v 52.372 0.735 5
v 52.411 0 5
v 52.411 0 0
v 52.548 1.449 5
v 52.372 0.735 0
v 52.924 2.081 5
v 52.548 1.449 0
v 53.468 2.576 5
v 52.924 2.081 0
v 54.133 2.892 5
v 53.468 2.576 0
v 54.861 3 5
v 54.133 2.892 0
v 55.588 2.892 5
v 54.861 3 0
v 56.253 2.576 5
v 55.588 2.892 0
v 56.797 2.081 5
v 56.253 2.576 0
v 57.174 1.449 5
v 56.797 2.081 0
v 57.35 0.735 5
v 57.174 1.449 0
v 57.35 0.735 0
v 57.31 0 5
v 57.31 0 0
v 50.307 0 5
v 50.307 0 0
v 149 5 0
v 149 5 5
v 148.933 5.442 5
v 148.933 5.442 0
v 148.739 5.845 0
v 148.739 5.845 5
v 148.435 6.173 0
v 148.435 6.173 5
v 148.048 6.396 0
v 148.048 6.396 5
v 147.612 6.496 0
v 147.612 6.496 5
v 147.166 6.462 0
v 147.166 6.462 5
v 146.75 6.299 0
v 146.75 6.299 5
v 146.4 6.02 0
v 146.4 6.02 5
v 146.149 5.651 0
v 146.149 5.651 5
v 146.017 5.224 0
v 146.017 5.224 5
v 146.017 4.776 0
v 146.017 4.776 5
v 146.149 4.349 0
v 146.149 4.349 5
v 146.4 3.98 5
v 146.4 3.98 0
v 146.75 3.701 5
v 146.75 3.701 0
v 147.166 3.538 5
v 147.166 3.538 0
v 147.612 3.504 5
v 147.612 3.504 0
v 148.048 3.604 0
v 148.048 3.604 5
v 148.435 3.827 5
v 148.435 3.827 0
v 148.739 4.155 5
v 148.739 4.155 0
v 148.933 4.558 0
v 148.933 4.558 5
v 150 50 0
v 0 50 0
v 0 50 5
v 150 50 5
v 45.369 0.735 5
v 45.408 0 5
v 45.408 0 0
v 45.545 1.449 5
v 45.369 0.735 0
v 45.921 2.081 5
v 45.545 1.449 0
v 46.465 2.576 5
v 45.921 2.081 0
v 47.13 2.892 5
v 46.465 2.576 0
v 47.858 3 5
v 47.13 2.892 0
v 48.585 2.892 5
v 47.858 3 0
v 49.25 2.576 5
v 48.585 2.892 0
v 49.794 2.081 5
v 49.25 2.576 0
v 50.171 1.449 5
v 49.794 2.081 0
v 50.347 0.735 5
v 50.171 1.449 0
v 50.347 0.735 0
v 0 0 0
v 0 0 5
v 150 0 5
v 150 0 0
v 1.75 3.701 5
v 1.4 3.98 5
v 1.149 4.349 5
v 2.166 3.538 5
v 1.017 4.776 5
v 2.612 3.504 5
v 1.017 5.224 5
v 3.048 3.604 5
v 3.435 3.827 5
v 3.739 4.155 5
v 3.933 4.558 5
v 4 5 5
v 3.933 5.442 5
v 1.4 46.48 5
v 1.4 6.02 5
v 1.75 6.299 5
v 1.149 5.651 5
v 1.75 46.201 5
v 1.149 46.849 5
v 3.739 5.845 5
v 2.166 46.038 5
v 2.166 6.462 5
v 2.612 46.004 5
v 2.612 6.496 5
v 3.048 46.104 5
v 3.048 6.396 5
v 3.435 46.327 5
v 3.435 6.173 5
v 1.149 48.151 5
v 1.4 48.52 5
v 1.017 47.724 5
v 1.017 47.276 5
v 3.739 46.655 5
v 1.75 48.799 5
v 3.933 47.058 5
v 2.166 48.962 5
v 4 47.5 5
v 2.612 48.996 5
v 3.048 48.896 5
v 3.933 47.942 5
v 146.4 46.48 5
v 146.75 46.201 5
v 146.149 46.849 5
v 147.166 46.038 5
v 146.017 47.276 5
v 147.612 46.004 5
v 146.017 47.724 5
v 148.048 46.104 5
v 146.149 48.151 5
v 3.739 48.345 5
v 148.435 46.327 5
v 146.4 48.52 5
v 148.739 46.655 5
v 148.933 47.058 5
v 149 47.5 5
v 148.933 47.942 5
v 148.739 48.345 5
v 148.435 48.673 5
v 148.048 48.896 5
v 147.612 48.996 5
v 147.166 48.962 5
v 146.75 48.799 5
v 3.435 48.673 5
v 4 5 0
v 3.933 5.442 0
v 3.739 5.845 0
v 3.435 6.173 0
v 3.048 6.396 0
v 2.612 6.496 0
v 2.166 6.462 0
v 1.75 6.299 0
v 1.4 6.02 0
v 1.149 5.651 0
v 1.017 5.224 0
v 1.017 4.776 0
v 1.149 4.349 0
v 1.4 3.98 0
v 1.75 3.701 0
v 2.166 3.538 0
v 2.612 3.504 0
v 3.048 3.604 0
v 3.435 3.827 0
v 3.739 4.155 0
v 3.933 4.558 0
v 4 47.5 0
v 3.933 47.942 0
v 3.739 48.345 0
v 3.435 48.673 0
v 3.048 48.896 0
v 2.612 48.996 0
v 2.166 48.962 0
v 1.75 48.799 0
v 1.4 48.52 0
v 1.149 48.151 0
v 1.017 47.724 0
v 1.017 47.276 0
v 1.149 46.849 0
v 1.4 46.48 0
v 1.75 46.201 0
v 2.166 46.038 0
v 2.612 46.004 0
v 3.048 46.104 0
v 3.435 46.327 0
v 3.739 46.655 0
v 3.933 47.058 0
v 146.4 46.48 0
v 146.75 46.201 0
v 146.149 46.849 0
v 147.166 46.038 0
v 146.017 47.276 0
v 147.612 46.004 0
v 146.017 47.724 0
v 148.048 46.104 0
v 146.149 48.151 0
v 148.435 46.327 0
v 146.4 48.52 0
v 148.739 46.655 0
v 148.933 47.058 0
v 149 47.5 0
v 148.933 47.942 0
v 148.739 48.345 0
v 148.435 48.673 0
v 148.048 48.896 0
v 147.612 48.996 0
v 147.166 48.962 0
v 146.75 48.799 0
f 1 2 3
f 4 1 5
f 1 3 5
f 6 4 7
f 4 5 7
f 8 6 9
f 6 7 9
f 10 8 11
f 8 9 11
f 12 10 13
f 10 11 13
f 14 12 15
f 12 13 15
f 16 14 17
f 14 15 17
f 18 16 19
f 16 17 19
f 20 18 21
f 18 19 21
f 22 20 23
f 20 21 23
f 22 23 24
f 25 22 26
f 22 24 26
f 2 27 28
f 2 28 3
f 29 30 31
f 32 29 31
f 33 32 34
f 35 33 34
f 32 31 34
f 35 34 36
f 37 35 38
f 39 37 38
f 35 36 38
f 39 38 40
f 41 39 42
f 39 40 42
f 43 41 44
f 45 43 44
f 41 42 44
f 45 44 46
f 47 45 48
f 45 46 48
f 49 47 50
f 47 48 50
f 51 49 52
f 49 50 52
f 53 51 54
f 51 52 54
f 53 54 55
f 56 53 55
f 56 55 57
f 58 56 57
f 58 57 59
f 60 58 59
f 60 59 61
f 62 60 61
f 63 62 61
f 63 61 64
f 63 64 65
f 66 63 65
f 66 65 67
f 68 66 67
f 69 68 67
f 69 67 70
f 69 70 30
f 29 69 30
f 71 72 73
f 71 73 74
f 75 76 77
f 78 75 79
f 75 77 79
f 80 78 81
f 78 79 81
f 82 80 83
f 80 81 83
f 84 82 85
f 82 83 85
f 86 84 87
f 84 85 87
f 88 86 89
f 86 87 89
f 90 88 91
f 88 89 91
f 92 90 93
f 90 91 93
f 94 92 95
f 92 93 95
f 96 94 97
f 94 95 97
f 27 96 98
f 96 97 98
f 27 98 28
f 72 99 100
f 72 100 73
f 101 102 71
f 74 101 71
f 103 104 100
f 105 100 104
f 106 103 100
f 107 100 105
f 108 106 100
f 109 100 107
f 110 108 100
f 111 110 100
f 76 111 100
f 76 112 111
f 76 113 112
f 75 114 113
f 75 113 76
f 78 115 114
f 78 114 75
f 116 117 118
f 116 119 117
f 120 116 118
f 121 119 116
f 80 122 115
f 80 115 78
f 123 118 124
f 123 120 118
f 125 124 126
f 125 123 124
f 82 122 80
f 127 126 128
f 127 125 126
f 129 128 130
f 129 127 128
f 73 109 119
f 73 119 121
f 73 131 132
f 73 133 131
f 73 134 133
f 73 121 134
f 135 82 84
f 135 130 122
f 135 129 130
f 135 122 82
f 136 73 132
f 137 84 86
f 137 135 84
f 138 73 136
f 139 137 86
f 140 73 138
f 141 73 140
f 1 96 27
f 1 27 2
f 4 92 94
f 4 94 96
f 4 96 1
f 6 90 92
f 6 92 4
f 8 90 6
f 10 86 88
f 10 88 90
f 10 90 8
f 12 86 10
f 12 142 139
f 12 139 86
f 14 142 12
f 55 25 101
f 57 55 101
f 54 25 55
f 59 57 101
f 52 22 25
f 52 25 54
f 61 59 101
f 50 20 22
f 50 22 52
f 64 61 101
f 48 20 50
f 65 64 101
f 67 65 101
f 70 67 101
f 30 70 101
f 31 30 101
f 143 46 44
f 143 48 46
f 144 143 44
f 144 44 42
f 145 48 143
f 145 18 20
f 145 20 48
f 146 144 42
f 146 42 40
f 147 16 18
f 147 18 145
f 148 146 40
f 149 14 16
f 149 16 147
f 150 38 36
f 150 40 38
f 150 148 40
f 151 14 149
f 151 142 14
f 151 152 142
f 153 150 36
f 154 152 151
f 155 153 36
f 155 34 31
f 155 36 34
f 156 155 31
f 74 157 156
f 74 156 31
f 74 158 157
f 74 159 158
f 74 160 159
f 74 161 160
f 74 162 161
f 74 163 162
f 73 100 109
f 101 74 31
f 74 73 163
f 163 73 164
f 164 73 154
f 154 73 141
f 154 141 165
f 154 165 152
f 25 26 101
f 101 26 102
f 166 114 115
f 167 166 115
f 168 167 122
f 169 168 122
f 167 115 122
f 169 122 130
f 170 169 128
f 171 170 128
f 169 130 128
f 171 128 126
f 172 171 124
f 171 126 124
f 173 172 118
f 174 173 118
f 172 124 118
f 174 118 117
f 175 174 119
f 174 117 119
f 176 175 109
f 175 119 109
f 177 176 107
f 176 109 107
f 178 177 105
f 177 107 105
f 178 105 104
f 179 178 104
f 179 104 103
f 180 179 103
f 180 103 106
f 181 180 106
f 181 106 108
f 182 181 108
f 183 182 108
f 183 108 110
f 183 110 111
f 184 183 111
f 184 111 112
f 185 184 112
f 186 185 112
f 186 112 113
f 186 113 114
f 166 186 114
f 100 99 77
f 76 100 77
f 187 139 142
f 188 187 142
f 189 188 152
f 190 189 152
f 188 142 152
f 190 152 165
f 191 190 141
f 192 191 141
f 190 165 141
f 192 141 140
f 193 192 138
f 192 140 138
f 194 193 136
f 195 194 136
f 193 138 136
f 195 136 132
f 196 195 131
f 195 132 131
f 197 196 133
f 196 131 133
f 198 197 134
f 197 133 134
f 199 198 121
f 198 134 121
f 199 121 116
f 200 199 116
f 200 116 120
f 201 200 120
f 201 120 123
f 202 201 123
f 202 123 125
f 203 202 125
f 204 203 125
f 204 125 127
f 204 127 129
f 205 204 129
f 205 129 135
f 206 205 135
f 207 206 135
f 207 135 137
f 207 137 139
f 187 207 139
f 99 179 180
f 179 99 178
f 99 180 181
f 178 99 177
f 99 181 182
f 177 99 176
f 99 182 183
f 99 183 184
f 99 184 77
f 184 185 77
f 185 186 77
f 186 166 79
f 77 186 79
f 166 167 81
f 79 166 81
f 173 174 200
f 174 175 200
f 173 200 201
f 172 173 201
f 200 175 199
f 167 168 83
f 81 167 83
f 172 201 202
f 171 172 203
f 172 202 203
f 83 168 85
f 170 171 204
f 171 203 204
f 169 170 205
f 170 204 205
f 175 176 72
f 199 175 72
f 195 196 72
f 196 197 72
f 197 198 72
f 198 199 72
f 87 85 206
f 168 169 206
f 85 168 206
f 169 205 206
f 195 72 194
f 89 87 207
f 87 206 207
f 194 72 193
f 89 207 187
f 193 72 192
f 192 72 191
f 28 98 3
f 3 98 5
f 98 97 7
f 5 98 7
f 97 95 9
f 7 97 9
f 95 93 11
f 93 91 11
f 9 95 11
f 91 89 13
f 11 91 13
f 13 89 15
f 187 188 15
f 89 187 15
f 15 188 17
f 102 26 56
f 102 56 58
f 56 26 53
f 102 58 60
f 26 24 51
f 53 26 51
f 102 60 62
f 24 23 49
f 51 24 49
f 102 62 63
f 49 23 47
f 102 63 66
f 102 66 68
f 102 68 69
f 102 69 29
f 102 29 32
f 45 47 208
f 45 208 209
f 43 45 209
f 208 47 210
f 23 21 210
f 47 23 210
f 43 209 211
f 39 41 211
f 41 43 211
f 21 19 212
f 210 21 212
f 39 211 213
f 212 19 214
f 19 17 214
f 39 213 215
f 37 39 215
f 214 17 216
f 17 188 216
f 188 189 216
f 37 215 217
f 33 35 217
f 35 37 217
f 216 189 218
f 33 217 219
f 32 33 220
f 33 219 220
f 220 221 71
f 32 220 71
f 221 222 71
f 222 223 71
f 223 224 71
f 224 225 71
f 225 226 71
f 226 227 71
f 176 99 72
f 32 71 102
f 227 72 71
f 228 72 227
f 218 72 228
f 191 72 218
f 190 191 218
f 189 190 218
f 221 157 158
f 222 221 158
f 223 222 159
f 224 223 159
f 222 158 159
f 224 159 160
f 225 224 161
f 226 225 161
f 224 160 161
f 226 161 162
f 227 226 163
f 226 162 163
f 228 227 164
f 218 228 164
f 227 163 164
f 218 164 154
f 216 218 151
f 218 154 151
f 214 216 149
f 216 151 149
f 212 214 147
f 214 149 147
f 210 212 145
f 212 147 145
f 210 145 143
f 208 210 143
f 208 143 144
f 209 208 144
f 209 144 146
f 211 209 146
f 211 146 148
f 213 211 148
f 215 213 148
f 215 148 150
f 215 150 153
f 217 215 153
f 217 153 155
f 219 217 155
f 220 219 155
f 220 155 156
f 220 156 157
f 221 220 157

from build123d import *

# Parameters (mm, degrees)
SKETCH1_W           = 150
SKETCH1_H           = 50
BOSS_EXTRUDE1_DEPTH = 5
SKETCH2_R           = 1.5
CUT_EXTRUDE1_DEPTH  = 10
SKETCH3_R           = 2.5
CUT_EXTRUDE2_DEPTH  = 159.192920196


with BuildPart() as part:
    # Sketch1 → Boss-Extrude1 (new body)
    with BuildSketch(Plane.XY):
        with Locations((75, 25)):
            Rectangle(SKETCH1_W, SKETCH1_H)
    extrude(amount=BOSS_EXTRUDE1_DEPTH)

    # Sketch2 → Cut-Extrude1 (cut)
    with BuildSketch(Plane.XY.offset(5)):
        with Locations((2.5, 5)):
            Circle(SKETCH2_R)
        with Locations((2.5, 47.5)):
            Circle(SKETCH2_R)
        with Locations((147.5, 47.5)):
            Circle(SKETCH2_R)
        with Locations((147.5, 5)):
            Circle(SKETCH2_R)
    extrude(amount=-CUT_EXTRUDE1_DEPTH, mode=Mode.SUBTRACT)

    # Sketch3 → Cut-Extrude2 (cut, through all)
    with BuildSketch(Plane(origin=(0, 0, 0), x_dir=(-1, 0, 0), z_dir=(0, 0, -1))):
        with Locations((-54.86063832, 0.5)):
            Circle(SKETCH3_R)
        with Locations((-47.857694484, 0.5)):
            Circle(SKETCH3_R)
    extrude(amount=-CUT_EXTRUDE2_DEPTH, mode=Mode.SUBTRACT)


solid = part.part
